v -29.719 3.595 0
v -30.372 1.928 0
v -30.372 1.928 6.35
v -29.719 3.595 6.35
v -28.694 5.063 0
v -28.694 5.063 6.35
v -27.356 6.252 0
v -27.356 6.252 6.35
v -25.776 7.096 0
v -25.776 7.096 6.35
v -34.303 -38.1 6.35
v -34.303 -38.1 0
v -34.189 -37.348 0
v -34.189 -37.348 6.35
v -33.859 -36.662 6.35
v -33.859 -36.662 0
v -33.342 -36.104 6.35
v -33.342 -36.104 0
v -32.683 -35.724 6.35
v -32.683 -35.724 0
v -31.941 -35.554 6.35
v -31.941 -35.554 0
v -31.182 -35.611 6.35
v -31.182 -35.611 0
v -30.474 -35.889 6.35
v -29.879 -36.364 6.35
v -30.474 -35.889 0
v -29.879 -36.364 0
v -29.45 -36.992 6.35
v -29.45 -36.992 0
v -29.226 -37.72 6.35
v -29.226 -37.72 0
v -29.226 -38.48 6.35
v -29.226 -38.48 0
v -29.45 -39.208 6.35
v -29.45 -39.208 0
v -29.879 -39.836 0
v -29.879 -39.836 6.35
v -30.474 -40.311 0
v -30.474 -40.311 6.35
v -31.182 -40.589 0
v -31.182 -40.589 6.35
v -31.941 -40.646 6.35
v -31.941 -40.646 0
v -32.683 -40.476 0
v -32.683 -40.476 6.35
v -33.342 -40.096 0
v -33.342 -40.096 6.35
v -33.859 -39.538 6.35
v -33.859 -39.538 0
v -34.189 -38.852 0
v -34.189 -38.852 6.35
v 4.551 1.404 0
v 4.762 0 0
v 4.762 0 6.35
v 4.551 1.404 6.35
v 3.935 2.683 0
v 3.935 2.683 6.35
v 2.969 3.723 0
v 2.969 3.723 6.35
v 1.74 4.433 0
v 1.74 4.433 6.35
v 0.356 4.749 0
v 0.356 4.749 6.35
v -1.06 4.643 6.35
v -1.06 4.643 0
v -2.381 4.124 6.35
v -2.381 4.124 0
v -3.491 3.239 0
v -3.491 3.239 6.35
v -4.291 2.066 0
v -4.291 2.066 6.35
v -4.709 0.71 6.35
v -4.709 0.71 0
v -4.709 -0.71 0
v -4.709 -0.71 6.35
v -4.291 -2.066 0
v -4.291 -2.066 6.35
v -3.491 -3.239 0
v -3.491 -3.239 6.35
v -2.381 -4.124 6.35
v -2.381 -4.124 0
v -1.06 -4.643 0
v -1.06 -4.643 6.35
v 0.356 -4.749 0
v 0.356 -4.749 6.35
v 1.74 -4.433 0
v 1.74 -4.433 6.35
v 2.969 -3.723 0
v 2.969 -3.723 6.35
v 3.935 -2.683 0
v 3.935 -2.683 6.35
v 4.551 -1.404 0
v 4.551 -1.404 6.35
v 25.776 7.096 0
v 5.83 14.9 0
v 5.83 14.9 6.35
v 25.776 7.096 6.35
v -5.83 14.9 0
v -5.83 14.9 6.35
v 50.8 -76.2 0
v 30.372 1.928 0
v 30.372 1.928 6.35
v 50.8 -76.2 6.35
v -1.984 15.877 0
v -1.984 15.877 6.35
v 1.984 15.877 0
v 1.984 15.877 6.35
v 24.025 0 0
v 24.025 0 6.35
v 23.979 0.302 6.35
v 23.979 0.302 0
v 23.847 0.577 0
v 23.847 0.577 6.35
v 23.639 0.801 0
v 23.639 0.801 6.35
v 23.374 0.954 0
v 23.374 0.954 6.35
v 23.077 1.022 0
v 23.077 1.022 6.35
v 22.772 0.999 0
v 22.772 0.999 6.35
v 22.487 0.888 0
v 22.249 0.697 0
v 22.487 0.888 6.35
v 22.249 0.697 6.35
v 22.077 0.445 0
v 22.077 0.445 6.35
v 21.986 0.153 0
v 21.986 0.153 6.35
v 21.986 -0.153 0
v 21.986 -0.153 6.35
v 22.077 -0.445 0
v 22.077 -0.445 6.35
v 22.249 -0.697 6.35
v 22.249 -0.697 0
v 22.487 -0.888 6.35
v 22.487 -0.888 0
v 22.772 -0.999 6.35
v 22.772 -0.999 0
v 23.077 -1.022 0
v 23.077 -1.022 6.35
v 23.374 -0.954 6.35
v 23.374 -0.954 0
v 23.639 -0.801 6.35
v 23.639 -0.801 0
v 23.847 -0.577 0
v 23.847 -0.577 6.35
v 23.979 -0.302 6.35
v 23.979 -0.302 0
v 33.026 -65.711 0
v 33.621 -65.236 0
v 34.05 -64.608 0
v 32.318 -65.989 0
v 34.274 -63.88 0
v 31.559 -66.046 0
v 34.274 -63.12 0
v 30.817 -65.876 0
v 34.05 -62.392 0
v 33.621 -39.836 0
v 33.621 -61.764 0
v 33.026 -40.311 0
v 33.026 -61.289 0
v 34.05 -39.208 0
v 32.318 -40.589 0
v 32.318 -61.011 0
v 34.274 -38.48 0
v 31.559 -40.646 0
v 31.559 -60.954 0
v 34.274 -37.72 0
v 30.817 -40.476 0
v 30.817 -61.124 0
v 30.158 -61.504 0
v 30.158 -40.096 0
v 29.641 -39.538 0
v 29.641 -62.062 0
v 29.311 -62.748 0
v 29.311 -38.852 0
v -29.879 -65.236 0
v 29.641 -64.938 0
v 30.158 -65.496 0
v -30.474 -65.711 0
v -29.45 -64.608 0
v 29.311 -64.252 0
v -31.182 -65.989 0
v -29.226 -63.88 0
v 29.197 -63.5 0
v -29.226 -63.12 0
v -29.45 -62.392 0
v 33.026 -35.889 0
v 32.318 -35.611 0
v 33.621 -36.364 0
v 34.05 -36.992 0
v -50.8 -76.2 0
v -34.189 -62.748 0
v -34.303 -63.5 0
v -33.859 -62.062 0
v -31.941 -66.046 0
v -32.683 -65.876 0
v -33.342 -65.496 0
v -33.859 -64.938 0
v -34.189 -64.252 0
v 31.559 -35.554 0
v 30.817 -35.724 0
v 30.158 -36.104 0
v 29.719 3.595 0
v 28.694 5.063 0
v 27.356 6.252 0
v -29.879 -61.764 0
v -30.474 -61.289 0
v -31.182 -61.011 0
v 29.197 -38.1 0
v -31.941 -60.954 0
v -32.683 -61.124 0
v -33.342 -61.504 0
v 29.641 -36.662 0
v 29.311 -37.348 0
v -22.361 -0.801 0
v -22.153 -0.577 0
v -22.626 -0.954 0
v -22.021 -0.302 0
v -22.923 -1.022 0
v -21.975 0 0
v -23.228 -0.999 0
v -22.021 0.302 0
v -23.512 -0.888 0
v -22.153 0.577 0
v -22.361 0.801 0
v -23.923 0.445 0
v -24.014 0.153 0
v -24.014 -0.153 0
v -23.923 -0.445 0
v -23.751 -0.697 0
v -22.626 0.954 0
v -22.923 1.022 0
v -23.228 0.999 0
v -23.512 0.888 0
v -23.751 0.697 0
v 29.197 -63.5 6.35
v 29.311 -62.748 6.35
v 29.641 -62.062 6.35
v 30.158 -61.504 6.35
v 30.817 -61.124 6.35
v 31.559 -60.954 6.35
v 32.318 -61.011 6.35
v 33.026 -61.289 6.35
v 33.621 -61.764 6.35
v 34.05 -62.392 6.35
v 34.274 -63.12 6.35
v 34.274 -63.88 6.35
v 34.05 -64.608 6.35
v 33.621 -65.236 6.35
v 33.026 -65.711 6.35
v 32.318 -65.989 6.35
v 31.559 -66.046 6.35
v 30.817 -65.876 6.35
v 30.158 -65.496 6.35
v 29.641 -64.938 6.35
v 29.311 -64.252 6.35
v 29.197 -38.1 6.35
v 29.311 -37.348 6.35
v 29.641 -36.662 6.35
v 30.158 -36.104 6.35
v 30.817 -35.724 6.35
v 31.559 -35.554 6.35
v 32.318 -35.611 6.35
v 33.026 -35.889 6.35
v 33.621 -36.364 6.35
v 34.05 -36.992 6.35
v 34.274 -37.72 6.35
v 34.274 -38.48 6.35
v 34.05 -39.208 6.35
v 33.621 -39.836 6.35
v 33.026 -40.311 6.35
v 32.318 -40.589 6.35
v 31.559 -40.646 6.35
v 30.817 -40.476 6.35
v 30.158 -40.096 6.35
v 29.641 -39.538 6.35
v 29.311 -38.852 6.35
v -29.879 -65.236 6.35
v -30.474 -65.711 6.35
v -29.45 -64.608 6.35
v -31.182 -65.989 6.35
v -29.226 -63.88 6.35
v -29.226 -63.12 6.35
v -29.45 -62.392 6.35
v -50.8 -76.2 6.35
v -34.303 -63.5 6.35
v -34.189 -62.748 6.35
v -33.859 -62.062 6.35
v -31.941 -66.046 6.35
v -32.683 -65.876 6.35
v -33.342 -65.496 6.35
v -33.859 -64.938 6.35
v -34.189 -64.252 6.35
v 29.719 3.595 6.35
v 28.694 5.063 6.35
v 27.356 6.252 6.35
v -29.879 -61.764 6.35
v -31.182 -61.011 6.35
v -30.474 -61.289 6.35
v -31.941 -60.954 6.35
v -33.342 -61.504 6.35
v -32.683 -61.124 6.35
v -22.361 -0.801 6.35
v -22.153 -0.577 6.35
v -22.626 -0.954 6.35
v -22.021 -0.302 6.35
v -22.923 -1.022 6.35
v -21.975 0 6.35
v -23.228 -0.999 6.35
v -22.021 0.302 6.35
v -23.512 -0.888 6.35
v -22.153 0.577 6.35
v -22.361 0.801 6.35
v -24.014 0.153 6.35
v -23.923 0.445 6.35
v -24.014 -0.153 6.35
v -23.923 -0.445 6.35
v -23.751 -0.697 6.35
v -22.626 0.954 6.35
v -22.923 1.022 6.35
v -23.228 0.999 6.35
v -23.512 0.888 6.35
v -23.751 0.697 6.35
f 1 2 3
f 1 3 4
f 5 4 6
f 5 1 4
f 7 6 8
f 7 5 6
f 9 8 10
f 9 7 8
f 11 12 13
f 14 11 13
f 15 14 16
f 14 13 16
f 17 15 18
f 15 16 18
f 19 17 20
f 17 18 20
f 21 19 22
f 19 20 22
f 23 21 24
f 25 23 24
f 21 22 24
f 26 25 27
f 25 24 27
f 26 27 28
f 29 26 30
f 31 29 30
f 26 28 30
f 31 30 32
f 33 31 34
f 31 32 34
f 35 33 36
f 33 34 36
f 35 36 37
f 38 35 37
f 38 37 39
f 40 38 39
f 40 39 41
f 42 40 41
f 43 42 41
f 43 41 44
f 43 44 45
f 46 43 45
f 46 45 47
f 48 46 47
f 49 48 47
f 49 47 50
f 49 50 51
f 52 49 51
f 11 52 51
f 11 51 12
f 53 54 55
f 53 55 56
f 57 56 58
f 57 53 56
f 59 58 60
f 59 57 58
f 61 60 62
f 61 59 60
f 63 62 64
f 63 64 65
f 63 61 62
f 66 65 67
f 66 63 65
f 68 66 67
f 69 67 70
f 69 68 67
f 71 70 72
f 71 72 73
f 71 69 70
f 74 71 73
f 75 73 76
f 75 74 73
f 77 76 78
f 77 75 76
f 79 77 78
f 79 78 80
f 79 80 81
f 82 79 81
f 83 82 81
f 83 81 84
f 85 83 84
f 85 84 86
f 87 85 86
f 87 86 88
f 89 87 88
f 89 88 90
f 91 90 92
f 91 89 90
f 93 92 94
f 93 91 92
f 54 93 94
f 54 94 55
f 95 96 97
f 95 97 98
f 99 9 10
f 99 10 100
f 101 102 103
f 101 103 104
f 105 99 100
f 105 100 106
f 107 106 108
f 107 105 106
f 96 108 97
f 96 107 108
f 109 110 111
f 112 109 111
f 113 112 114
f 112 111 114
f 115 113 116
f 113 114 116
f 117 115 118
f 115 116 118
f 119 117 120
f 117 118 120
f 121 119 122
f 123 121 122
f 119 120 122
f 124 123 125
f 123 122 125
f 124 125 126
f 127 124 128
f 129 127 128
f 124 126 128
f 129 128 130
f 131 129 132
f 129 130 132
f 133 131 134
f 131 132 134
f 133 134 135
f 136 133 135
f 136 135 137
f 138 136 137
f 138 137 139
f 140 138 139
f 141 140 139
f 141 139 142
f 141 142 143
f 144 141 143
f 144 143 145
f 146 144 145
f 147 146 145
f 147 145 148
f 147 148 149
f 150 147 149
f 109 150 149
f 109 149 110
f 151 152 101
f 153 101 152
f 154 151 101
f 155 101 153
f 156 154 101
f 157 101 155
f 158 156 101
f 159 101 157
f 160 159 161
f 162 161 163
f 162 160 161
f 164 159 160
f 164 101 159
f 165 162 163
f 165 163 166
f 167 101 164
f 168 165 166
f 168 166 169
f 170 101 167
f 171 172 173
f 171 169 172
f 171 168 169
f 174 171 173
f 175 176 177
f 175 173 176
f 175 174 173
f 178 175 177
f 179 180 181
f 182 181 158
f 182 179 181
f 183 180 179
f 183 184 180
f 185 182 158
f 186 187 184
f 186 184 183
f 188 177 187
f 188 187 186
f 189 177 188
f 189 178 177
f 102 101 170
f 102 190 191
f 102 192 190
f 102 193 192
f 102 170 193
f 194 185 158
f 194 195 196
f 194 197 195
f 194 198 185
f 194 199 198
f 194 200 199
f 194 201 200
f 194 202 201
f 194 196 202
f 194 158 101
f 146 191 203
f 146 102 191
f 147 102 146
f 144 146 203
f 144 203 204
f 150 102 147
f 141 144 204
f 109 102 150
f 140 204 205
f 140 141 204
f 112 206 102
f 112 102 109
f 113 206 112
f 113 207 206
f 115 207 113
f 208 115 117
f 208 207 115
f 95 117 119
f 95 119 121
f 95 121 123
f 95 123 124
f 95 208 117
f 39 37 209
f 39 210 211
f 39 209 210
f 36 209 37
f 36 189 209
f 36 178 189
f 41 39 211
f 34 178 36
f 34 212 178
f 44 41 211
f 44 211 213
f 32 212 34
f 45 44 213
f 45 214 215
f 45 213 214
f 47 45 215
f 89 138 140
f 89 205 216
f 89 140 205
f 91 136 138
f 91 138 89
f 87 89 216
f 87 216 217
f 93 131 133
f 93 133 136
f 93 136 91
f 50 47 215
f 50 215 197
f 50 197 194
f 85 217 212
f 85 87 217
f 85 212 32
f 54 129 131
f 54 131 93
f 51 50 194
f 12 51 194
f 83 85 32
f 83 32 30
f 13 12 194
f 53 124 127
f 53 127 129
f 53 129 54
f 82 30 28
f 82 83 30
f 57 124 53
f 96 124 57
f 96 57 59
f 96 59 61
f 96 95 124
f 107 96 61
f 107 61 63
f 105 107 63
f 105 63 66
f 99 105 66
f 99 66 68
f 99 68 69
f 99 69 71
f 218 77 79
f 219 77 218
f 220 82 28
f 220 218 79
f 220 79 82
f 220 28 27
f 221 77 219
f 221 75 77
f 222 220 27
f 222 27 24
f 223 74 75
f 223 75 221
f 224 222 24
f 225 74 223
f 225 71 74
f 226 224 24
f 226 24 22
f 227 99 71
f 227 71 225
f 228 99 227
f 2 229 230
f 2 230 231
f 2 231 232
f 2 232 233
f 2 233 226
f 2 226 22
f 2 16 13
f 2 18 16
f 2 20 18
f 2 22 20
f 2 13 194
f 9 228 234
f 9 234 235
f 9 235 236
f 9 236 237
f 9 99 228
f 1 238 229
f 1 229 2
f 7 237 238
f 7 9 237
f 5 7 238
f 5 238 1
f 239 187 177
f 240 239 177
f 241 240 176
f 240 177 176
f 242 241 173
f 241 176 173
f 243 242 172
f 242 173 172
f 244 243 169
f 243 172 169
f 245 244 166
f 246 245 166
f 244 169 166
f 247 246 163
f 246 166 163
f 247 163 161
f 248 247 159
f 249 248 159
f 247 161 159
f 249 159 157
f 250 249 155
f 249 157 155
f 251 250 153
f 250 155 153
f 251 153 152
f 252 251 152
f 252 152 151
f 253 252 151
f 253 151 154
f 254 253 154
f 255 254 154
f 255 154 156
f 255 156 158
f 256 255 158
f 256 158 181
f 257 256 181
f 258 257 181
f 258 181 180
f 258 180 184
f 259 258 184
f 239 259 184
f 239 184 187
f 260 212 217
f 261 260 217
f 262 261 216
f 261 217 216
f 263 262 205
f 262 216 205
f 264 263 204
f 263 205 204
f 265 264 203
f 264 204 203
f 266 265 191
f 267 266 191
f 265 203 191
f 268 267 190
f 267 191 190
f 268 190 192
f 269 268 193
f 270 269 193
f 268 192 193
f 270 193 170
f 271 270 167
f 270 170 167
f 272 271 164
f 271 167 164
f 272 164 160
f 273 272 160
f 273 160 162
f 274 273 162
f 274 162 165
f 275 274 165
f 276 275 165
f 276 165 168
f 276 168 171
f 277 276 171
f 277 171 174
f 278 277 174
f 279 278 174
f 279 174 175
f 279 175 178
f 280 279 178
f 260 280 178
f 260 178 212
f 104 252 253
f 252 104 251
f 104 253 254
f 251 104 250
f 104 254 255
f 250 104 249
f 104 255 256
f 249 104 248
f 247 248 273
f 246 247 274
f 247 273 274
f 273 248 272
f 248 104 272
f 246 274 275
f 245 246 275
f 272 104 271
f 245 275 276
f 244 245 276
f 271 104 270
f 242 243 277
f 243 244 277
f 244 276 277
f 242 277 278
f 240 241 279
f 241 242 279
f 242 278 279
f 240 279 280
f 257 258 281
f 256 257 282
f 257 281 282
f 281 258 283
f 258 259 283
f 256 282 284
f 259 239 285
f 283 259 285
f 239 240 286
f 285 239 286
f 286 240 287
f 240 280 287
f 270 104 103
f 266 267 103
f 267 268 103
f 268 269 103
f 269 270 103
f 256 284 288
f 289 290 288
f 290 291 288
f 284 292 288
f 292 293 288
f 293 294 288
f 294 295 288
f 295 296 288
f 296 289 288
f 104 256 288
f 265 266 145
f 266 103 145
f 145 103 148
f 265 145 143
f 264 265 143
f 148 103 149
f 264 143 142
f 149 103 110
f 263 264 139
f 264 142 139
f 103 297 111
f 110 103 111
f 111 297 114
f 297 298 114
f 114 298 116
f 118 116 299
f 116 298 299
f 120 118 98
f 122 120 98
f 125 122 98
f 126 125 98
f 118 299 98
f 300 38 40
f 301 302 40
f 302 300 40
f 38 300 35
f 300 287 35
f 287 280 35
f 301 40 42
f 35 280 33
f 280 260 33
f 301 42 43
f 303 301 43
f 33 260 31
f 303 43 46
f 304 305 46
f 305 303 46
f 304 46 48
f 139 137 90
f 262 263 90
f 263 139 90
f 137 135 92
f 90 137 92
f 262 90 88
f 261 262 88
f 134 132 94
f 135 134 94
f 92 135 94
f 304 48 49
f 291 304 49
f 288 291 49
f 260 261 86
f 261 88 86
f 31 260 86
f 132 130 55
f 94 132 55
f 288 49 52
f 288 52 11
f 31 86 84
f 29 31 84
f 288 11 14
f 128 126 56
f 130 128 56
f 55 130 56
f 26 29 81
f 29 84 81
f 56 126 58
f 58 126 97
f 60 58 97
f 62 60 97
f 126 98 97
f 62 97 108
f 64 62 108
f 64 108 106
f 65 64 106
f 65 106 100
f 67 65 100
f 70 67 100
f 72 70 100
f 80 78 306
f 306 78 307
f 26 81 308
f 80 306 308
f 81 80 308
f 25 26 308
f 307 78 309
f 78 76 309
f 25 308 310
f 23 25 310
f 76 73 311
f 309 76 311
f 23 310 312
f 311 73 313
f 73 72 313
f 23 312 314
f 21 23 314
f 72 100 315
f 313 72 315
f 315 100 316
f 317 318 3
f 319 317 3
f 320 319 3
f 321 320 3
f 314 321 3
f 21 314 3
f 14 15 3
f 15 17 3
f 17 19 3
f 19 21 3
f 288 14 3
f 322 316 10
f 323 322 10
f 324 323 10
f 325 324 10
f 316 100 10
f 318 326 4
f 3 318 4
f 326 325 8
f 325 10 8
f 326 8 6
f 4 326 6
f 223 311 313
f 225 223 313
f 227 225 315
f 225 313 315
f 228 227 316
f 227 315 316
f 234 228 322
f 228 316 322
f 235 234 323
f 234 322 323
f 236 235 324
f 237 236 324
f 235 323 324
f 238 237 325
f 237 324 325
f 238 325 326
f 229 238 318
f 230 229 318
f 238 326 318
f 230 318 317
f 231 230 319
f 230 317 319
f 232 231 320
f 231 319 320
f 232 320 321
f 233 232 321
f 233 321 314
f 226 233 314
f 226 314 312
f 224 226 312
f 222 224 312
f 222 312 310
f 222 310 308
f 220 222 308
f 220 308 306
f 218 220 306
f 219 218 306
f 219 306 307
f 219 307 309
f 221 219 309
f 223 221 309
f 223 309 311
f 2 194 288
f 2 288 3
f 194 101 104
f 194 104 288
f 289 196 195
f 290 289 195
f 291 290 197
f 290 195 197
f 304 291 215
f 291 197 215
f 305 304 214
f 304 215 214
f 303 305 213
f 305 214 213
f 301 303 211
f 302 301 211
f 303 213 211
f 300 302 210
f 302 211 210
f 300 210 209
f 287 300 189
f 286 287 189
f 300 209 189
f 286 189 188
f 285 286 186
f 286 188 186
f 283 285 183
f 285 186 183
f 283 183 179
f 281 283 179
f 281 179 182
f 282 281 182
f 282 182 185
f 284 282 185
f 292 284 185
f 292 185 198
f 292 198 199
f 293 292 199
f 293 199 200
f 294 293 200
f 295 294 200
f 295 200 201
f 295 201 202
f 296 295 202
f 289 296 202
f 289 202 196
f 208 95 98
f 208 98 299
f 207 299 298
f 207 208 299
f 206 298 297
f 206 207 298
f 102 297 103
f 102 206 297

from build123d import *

# Parameters (mm, degrees)
SKETCH1_R                = 4.7625
SKETCH1_R_2              = 1.5875
BOSS_EXTRUDE1_DEPTH      = 6.35
M2_5X0_45_TAPPED_HOLE1_D = 2.05
F_1_4_20_TAPPED_HOLE1_D  = 5.1054


with BuildPart() as part:
    # Sketch1 → Boss-Extrude1 (new body)
    with BuildSketch(Plane.XY):
        with BuildLine():
            Line((-25.776330412, 7.096223594), (-5.829565224, 14.900207022))
            ThreePointArc((-5.829565224, 14.900207022), (0, 16), (5.829565224, 14.900207022))
            Line((5.829565224, 14.900207022), (25.776330412, 7.096223594))
            ThreePointArc((25.776330412, 7.096223594), (28.694445061, 5.063367965), (30.372165524, 1.92758271))
            Line((30.372165524, 1.92758271), (50.8, -76.2))
            Line((50.8, -76.2), (-50.8, -76.2))
            Line((-50.8, -76.2), (-30.372165524, 1.92758271))
            ThreePointArc((-30.372165524, 1.92758271), (-28.694445061, 5.063367965), (-25.776330412, 7.096223594))
        make_face()
        Circle(SKETCH1_R, mode=Mode.SUBTRACT)
        with Locations((-31.75, -38.1)):
            Circle(SKETCH1_R_2, mode=Mode.SUBTRACT)
        with Locations((31.75, -38.1)):
            Circle(SKETCH1_R_2, mode=Mode.SUBTRACT)
        with Locations((-31.75, -63.5)):
            Circle(SKETCH1_R_2, mode=Mode.SUBTRACT)
        with Locations((31.75, -63.5)):
            Circle(SKETCH1_R_2, mode=Mode.SUBTRACT)
    extrude(amount=BOSS_EXTRUDE1_DEPTH)

    # M2.5x0.45 Tapped Hole1 (through all)
    with Locations(Plane(origin=(0, 0, 0), x_dir=(-1, 0, 0), z_dir=(0, 0, -1))):
        with Locations((-22.999999974, 0), (22.999999974, 0)):
            Hole(M2_5X0_45_TAPPED_HOLE1_D / 2)

    # 1/4-20 Tapped Hole1 (through all)
    with Locations(Plane.XY.offset(6.35)):
        with Locations((-31.75, -38.1), (-31.75, -63.5), (31.75, -63.5), (31.75, -38.1)):
            Hole(F_1_4_20_TAPPED_HOLE1_D / 2)


solid = part.part
